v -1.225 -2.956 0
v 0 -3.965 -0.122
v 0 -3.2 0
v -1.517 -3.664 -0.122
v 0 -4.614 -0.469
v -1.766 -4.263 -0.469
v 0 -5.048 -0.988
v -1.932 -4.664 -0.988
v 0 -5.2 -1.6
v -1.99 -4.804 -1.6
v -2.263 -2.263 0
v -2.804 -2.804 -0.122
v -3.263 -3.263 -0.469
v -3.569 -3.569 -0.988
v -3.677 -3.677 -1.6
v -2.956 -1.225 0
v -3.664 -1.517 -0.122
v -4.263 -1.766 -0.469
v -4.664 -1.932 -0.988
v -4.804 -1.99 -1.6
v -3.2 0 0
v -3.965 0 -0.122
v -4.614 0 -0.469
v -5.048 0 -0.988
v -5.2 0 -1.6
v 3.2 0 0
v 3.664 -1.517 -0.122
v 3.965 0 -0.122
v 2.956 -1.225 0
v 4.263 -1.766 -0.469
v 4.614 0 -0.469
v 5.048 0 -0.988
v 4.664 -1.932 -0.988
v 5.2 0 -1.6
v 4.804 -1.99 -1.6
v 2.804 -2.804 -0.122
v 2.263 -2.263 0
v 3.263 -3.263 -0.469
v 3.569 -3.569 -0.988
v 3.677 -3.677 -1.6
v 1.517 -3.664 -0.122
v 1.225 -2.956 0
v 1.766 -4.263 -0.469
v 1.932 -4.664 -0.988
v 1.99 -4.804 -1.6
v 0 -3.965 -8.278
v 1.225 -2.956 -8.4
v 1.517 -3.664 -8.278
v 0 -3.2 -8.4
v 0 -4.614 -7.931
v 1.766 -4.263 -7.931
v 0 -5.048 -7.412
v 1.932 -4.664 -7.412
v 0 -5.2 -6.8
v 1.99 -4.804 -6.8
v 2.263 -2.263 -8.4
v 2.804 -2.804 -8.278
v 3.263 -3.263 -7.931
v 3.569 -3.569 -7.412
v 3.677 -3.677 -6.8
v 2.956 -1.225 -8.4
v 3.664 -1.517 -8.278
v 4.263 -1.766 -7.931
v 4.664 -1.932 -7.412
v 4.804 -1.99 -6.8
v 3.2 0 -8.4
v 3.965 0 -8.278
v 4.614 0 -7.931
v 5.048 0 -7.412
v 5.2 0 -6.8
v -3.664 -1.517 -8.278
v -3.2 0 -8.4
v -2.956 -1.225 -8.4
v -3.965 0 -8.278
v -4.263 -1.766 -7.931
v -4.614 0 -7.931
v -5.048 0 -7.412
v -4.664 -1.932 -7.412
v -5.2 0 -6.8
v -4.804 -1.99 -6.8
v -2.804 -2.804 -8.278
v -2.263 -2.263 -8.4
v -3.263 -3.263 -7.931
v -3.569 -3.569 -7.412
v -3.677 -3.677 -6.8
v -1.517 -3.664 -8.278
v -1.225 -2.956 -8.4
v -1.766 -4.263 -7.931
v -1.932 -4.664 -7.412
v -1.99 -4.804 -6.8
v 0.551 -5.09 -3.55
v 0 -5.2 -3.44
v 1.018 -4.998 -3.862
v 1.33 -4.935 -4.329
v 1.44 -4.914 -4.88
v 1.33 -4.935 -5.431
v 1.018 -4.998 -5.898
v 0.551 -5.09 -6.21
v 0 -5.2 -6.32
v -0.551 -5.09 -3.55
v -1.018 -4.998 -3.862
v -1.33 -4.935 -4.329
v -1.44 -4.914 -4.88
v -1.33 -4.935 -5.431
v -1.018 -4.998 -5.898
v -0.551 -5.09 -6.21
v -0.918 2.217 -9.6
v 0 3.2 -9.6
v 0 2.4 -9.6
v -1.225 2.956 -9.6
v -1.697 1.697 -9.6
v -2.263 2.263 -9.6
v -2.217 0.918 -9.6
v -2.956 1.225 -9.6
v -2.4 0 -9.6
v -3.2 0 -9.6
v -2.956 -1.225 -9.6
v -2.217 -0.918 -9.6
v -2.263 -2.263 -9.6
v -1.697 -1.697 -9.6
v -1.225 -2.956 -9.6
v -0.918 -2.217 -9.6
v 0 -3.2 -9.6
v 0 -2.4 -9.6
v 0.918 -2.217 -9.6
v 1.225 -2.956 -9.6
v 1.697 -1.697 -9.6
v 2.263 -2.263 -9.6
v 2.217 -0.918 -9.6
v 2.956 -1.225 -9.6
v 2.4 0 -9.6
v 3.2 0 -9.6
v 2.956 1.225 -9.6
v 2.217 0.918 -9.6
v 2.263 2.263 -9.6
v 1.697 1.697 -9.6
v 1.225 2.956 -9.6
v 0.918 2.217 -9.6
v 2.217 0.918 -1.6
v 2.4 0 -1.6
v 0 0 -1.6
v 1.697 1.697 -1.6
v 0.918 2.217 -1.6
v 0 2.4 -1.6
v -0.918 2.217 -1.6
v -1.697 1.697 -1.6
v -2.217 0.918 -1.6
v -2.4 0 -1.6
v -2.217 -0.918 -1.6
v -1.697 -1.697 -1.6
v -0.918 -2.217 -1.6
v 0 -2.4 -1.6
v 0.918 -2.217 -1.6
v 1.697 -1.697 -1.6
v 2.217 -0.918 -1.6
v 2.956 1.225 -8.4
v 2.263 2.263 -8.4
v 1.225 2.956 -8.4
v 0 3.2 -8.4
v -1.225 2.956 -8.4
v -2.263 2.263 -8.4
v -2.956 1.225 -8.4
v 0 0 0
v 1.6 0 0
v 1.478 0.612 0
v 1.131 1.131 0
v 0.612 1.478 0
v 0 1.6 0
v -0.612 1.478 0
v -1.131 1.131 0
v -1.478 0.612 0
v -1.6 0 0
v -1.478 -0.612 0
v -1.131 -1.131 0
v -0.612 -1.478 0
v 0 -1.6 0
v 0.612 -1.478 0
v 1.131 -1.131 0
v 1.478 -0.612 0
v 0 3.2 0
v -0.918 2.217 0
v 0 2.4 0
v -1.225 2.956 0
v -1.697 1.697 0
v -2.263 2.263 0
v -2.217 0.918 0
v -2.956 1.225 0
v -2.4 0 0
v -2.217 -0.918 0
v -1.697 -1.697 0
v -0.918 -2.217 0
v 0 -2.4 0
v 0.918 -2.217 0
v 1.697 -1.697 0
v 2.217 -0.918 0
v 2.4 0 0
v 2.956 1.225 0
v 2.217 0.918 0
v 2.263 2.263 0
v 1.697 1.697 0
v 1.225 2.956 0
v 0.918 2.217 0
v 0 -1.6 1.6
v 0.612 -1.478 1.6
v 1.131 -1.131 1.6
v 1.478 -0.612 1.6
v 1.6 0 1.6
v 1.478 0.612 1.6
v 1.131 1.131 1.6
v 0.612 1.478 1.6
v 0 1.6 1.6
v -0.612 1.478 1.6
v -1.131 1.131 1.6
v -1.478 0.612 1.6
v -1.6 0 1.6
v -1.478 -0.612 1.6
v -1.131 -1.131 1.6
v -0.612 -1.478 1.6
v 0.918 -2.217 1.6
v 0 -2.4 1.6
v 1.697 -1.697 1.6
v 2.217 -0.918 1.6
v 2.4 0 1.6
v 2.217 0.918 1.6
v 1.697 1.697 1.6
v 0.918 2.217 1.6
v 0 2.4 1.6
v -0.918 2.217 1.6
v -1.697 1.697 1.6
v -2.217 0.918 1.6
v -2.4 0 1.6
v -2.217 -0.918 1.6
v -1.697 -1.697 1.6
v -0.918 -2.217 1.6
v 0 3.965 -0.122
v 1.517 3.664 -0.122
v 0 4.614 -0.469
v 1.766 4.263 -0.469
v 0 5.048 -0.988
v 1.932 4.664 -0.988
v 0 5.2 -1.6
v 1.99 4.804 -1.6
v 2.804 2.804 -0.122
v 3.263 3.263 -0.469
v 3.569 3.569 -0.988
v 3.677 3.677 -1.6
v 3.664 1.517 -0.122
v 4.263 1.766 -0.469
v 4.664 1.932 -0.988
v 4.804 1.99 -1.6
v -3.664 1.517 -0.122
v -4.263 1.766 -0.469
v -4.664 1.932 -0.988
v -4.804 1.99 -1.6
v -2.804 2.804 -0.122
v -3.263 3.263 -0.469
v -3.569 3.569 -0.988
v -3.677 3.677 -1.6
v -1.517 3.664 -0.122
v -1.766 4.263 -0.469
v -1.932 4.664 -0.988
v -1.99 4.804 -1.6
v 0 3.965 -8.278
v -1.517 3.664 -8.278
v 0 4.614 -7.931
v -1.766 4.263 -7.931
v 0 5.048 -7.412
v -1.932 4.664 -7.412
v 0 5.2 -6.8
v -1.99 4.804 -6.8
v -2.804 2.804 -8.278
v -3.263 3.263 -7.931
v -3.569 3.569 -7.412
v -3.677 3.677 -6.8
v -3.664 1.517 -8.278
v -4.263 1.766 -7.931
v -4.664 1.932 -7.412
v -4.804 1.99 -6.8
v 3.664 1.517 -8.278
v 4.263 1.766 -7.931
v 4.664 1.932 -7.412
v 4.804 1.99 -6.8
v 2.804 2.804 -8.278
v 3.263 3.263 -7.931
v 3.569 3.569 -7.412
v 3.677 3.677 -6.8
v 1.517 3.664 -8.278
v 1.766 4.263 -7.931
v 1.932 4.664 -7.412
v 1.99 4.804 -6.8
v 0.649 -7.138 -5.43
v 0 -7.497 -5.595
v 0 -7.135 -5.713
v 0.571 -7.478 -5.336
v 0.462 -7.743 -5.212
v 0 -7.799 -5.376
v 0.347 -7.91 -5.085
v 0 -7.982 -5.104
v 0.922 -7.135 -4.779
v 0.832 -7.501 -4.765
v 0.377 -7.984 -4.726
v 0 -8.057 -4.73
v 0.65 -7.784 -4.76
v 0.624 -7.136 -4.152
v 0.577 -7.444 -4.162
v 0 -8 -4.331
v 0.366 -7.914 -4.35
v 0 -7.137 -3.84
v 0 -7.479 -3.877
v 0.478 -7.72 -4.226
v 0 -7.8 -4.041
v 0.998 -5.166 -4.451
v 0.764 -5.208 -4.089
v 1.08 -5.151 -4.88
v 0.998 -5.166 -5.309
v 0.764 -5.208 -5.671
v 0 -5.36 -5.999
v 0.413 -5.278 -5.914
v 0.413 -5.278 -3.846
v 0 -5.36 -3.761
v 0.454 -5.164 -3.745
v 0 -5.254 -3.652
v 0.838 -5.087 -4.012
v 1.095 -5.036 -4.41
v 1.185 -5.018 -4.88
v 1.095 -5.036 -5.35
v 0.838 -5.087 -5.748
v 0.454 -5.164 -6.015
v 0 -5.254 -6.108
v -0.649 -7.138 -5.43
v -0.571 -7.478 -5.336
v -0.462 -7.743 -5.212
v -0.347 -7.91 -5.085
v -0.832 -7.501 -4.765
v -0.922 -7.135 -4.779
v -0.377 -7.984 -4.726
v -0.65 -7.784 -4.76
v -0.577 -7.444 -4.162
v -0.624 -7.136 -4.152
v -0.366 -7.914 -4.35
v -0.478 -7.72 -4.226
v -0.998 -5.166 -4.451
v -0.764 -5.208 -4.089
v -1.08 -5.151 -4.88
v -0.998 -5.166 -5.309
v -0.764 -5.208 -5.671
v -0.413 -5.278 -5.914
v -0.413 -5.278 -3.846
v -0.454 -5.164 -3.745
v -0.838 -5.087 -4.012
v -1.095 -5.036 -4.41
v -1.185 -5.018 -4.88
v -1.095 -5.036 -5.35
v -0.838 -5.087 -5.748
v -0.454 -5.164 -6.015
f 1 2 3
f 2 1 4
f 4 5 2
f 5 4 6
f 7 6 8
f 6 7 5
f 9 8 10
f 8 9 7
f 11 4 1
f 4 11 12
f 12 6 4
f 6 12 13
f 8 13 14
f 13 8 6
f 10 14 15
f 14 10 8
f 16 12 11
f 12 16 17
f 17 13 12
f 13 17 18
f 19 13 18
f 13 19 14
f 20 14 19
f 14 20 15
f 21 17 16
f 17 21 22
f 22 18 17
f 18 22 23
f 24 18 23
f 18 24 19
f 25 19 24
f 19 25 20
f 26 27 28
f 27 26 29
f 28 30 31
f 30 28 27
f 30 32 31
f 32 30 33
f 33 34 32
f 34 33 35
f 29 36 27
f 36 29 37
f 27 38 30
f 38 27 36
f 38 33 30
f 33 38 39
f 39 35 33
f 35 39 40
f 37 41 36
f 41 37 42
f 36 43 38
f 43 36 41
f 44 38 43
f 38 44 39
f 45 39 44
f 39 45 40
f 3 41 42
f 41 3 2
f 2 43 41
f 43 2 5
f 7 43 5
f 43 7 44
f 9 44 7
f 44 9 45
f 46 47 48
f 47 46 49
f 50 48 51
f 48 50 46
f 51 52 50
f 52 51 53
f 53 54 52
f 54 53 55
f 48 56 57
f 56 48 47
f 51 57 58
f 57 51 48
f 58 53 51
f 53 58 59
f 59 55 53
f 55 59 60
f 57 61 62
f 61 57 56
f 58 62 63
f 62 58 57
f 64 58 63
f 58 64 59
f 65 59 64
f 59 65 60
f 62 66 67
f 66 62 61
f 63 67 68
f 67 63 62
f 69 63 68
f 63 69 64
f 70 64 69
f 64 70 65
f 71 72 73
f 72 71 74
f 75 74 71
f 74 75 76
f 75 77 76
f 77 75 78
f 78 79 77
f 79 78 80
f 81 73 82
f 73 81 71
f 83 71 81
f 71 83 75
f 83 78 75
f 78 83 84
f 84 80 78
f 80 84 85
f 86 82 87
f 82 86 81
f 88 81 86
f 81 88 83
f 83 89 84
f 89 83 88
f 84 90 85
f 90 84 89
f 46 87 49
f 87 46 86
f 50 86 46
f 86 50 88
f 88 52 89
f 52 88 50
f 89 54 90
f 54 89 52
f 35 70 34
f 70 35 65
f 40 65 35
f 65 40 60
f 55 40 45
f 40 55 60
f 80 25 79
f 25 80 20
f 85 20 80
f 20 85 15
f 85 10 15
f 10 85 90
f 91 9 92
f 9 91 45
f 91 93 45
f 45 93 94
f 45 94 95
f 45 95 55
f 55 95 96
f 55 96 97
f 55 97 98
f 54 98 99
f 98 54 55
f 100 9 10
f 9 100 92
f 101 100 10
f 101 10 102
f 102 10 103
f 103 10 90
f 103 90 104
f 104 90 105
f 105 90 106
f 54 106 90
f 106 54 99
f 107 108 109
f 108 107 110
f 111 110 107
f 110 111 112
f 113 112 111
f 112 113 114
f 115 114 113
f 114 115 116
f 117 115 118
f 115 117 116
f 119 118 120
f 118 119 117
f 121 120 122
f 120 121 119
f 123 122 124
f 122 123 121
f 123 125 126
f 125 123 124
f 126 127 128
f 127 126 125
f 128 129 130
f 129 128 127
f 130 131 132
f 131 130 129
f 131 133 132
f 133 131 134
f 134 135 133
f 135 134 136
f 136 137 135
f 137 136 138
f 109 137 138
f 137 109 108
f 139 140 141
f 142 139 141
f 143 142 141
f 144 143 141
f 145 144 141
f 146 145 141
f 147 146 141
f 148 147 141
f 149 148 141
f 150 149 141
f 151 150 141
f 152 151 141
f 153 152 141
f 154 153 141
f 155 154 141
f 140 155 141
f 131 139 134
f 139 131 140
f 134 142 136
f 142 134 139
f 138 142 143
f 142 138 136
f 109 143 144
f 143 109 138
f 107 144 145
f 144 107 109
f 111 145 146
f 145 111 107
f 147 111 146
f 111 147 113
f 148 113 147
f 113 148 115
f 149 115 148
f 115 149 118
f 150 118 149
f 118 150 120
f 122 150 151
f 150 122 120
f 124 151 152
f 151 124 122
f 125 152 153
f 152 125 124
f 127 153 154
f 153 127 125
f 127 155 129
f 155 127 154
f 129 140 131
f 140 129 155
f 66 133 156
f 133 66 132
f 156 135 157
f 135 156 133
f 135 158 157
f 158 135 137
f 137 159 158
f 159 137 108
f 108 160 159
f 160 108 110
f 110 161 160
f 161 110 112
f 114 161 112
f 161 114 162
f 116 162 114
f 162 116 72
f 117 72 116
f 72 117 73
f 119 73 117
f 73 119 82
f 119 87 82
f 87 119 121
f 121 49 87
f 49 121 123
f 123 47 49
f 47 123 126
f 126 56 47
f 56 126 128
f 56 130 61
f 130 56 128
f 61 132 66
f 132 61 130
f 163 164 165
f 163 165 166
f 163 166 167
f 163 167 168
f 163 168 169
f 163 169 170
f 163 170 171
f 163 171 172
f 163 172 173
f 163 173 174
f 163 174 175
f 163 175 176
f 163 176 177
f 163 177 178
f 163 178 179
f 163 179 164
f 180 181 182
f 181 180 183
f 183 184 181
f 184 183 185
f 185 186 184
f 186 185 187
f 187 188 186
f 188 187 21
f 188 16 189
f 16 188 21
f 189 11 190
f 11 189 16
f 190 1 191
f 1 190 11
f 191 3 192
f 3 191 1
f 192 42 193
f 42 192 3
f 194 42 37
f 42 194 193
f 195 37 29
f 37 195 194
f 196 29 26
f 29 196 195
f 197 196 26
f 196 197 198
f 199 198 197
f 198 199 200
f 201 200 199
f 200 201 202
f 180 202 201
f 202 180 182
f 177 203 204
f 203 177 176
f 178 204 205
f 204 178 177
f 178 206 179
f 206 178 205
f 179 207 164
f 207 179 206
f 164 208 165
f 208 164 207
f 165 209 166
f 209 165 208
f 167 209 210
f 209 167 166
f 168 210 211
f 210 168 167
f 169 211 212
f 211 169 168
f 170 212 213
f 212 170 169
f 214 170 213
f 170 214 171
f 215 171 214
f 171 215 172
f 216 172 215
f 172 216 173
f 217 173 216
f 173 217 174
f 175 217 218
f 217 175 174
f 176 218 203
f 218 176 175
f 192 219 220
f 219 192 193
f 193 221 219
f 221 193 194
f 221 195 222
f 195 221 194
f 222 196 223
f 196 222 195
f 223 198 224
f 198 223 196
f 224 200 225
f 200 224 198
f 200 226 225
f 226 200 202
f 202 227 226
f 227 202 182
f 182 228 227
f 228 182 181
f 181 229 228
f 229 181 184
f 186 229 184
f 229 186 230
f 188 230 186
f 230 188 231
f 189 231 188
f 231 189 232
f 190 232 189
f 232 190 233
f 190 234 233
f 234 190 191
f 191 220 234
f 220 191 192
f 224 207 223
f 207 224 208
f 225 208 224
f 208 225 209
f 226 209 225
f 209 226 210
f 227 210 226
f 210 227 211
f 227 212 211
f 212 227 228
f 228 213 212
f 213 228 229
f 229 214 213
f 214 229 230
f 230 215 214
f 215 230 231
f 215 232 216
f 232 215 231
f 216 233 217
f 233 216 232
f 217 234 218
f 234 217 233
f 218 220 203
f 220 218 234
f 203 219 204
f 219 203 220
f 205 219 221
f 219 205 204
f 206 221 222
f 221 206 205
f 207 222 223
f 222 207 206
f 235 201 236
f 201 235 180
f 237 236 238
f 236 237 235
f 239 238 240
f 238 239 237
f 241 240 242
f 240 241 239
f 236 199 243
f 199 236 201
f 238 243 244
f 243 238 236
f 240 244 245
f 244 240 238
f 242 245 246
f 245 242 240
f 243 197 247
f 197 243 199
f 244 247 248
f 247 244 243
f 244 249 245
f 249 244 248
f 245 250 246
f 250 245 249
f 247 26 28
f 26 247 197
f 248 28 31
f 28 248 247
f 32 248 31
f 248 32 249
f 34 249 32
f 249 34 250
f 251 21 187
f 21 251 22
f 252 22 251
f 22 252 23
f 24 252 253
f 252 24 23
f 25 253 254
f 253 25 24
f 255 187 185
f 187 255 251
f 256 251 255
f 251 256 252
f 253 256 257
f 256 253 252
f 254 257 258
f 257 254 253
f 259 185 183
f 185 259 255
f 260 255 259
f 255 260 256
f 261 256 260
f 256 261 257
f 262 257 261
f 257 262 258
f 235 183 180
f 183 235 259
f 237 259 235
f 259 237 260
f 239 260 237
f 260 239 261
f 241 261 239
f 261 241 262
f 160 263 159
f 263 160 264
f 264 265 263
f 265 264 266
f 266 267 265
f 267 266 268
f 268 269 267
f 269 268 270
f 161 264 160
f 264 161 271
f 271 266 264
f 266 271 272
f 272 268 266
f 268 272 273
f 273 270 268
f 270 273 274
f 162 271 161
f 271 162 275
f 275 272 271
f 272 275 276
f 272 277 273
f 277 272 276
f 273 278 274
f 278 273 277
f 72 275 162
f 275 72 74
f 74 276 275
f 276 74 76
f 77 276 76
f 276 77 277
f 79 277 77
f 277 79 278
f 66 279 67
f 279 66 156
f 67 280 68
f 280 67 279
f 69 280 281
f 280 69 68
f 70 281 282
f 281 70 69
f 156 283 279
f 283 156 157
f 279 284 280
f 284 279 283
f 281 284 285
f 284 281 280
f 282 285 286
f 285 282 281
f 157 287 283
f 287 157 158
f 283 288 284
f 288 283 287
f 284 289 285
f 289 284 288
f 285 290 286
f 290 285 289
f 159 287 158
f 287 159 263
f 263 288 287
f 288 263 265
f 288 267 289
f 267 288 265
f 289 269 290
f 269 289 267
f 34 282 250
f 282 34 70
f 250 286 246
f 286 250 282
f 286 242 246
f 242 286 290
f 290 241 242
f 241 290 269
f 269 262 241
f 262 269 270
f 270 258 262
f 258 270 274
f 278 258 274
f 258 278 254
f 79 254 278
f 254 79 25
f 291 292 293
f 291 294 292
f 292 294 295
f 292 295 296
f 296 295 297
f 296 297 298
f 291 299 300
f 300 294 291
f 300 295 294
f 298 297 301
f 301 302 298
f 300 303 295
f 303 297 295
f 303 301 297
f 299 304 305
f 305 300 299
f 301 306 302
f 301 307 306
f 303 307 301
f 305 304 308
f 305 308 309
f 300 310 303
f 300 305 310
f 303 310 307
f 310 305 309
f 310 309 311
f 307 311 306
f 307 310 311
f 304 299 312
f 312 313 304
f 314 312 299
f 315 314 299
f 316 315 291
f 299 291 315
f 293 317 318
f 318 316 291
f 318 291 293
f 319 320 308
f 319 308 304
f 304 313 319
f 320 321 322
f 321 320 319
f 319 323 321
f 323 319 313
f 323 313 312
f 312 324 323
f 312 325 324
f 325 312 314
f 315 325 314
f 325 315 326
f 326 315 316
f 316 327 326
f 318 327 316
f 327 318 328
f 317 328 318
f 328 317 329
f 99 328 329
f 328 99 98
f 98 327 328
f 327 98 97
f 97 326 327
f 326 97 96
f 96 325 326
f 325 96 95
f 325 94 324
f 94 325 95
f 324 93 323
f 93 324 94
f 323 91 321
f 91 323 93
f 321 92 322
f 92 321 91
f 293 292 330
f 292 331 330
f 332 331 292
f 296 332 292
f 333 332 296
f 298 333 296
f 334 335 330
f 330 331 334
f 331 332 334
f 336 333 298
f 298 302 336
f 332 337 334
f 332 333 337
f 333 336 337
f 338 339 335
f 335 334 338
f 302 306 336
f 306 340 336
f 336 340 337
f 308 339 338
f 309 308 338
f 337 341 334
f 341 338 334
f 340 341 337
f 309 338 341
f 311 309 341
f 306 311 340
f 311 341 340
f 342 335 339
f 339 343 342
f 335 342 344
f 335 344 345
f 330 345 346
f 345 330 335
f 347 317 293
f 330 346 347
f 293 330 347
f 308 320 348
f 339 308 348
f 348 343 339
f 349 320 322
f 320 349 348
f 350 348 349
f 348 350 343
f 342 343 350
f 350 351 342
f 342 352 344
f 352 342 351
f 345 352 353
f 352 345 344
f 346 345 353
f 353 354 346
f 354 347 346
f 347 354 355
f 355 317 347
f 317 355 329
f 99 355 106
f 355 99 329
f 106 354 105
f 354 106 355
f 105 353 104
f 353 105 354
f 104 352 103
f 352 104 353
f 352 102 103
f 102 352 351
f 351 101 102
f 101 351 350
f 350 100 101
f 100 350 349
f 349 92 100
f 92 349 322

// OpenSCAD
use <../lib.scad>
use <../p/3-16cyli.scad>
use <s/102525s01.scad>
use <../p/t04o6250.scad>
function ldraw_lib__102525() = [
// 0 Minifig Head with Elongated Nose
// 0 Name: 102525.dat
// 0 Author: Gerald Lasser [GeraldLasser]
// 0 !LDRAW_ORG Part UPDATE 2026-08
// 0 !LICENSE Licensed under CC BY 4.0 : see CAreadme.txt
// 
// 0 BFC CERTIFY CCW
  [0,"BFC","CERTIFY"],
  [0,"BFC","CCW"],
// 
// 0 !CATEGORY Minifig Head
// 0 !KEYWORDS Disney 100, Pinocchio
// 
// 0 !HISTORY 2023-05-08 {LEGO Instructions App} Original part shape
// 0 !HISTORY 2023-11-27 [GeraldLasser] File preparation for LDraw Parts Tracker
// 0 !HISTORY 2026-08-31 [OrionP] Official Update 2026-08
// 
// 1 16 0 4 0 0 0 -8 0 -6.4 0 -8 0 0 t04o6250.dat
  [1,16,0,4,0,0,0,-8,0,-6.4,0,-8,0,0, ldraw_lib__t04o6250()],
// 1 16 0 4 0 8 0 0 0 -6.4 0 0 0 -8 t04o6250.dat
  [1,16,0,4,0,8,0,0,0,-6.4,0,0,0,-8, ldraw_lib__t04o6250()],
// 1 16 0 17 0 0 0 8 0 6.4 0 -8 0 0 t04o6250.dat
  [1,16,0,17,0,0,0,8,0,6.4,0,-8,0,0, ldraw_lib__t04o6250()],
// 1 16 0 17 0 -8 0 0 0 6.4 0 0 0 -8 t04o6250.dat
  [1,16,0,17,0,-8,0,0,0,6.4,0,0,0,-8, ldraw_lib__t04o6250()],
// 
// 1 16 0 4 0 13 0 0 0 13 0 0 0 -13 3-16cyli.dat
  [1,16,0,4,0,13,0,0,0,13,0,0,0,-13, ldraw_lib__3_16cyli()],
// 1 16 0 4 0 -13 0 0 0 13 0 0 0 -13 3-16cyli.dat
  [1,16,0,4,0,-13,0,0,0,13,0,0,0,-13, ldraw_lib__3_16cyli()],
// 
// 4 16 4.9751 4 -12.0107 0 4 -13 0 8.6 -13 1.3777 8.874 -12.726
  [4,16,4.9751,4,-12.0107,0,4,-13,0,8.6,-13,1.3777,8.874,-12.726],
// 3 16 1.3777 8.874 -12.726 2.5456 9.6544 -12.4938 4.9751 4 -12.0107
  [3,16,1.3777,8.874,-12.726,2.5456,9.6544,-12.4938,4.9751,4,-12.0107],
// 3 16 4.9751 4 -12.0107 2.5456 9.6544 -12.4938 3.326 10.8223 -12.3386
  [3,16,4.9751,4,-12.0107,2.5456,9.6544,-12.4938,3.326,10.8223,-12.3386],
// 3 16 4.9751 4 -12.0107 3.326 10.8223 -12.3386 3.6 12.2 -12.2841
  [3,16,4.9751,4,-12.0107,3.326,10.8223,-12.3386,3.6,12.2,-12.2841],
// 3 16 4.9751 4 -12.0107 3.6 12.2 -12.2841 4.9751 17 -12.0107
  [3,16,4.9751,4,-12.0107,3.6,12.2,-12.2841,4.9751,17,-12.0107],
// 3 16 4.9751 17 -12.0107 3.6 12.2 -12.2841 3.326 13.5777 -12.3386
  [3,16,4.9751,17,-12.0107,3.6,12.2,-12.2841,3.326,13.5777,-12.3386],
// 3 16 4.9751 17 -12.0107 3.326 13.5777 -12.3386 2.5456 14.7456 -12.4938
  [3,16,4.9751,17,-12.0107,3.326,13.5777,-12.3386,2.5456,14.7456,-12.4938],
// 3 16 4.9751 17 -12.0107 2.5456 14.7456 -12.4938 1.3777 15.526 -12.726
  [3,16,4.9751,17,-12.0107,2.5456,14.7456,-12.4938,1.3777,15.526,-12.726],
// 4 16 1.3777 15.526 -12.726 0 15.8 -13 0 17 -13 4.9751 17 -12.0107
  [4,16,1.3777,15.526,-12.726,0,15.8,-13,0,17,-13,4.9751,17,-12.0107],
// 
// 4 16 0 8.6 -13 0 4 -13 -4.9751 4 -12.0107 -1.3777 8.874 -12.726
  [4,16,0,8.6,-13,0,4,-13,-4.9751,4,-12.0107,-1.3777,8.874,-12.726],
// 3 16 -2.5456 9.6544 -12.4938 -1.3777 8.874 -12.726 -4.9751 4 -12.0107
  [3,16,-2.5456,9.6544,-12.4938,-1.3777,8.874,-12.726,-4.9751,4,-12.0107],
// 3 16 -2.5456 9.6544 -12.4938 -4.9751 4 -12.0107 -3.326 10.8223 -12.3386
  [3,16,-2.5456,9.6544,-12.4938,-4.9751,4,-12.0107,-3.326,10.8223,-12.3386],
// 3 16 -3.326 10.8223 -12.3386 -4.9751 4 -12.0107 -3.6 12.2 -12.2841
  [3,16,-3.326,10.8223,-12.3386,-4.9751,4,-12.0107,-3.6,12.2,-12.2841],
// 3 16 -3.6 12.2 -12.2841 -4.9751 4 -12.0107 -4.9751 17 -12.0107
  [3,16,-3.6,12.2,-12.2841,-4.9751,4,-12.0107,-4.9751,17,-12.0107],
// 3 16 -3.6 12.2 -12.2841 -4.9751 17 -12.0107 -3.326 13.5777 -12.3386
  [3,16,-3.6,12.2,-12.2841,-4.9751,17,-12.0107,-3.326,13.5777,-12.3386],
// 3 16 -3.326 13.5777 -12.3386 -4.9751 17 -12.0107 -2.5456 14.7456 -12.4938
  [3,16,-3.326,13.5777,-12.3386,-4.9751,17,-12.0107,-2.5456,14.7456,-12.4938],
// 3 16 -2.5456 14.7456 -12.4938 -4.9751 17 -12.0107 -1.3777 15.526 -12.726
  [3,16,-2.5456,14.7456,-12.4938,-4.9751,17,-12.0107,-1.3777,15.526,-12.726],
// 4 16 0 17 -13 0 15.8 -13 -1.3777 15.526 -12.726 -4.9751 17 -12.0107
  [4,16,0,17,-13,0,15.8,-13,-1.3777,15.526,-12.726,-4.9751,17,-12.0107],
// 
// 1 16 0 0 0 1 0 0 0 1 0 0 0 1 s\102525s01.dat
  [1,16,0,0,0,1,0,0,0,1,0,0,0,1, ldraw_lib__s__102525s01()],
// 
// 5 24 0 8.6 -13 0 4 -13 4.9751 4 -12.0107 -4.9752 4 -12.0104
  [5,24,0,8.6,-13,0,4,-13,4.9751,4,-12.0107,-4.9752,4,-12.0104],
// 5 24 0 17 -13 0 15.8 -13 4.9751 17 -12.0107 -4.9752 17 -12.0104
  [5,24,0,17,-13,0,15.8,-13,4.9751,17,-12.0107,-4.9752,17,-12.0104],
// 5 24 4.9751 4 -12.0107 4.9751 17 -12.0107 0 17 -13 9.192 17 -9.192
  [5,24,4.9751,4,-12.0107,4.9751,17,-12.0107,0,17,-13,9.192,17,-9.192],
// 5 24 -4.9752 4 -12.0104 -4.9752 17 -12.0104 -9.1923 17 -9.1923 0 17 -13
  [5,24,-4.9752,4,-12.0104,-4.9752,17,-12.0104,-9.1923,17,-9.1923,0,17,-13],
// 
// 5 24 3.326 13.5777 -12.3386 2.5456 14.7456 -12.4938 4.9751 17 -12.0107 2.7382 13.375 -12.5903
  [5,24,3.326,13.5777,-12.3386,2.5456,14.7456,-12.4938,4.9751,17,-12.0107,2.7382,13.375,-12.5903],
// 5 24 0 15.8 -13 -1.3777 15.526 -12.726 -1.134 15.037 -12.9093 -4.9751 17 -12.0107
  [5,24,0,15.8,-13,-1.3777,15.526,-12.726,-1.134,15.037,-12.9093,-4.9751,17,-12.0107],
// 5 24 -1.3777 15.526 -12.726 -2.5456 14.7456 -12.4938 -4.9751 17 -12.0107 -2.0956 14.3712 -12.7181
  [5,24,-1.3777,15.526,-12.726,-2.5456,14.7456,-12.4938,-4.9751,17,-12.0107,-2.0956,14.3712,-12.7181],
// 5 24 -1.3777 8.874 -12.726 0 8.6 -13 0 9.1295 -13.1348 0 4 -13
  [5,24,-1.3777,8.874,-12.726,0,8.6,-13,0,9.1295,-13.1348,0,4,-13],
// 5 24 3.6 12.2 -12.2841 3.326 13.5777 -12.3386 4.9751 17 -12.0107 2.9635 12.2 -12.5455
  [5,24,3.6,12.2,-12.2841,3.326,13.5777,-12.3386,4.9751,17,-12.0107,2.9635,12.2,-12.5455],
// 5 24 -2.5456 9.6544 -12.4938 -1.3777 8.874 -12.726 -1.134 9.363 -12.9093 -4.9751 4 -12.0107
  [5,24,-2.5456,9.6544,-12.4938,-1.3777,8.874,-12.726,-1.134,9.363,-12.9093,-4.9751,4,-12.0107],
// 5 24 0 15.8 -13 1.3777 15.526 -12.726 1.134 15.037 -12.9093 0 17 -13
  [5,24,0,15.8,-13,1.3777,15.526,-12.726,1.134,15.037,-12.9093,0,17,-13],
// 5 24 -3.6 12.2 -12.2841 -3.326 10.8223 -12.3386 -2.7382 11.0251 -12.5903 -4.9751 4 -12.0107
  [5,24,-3.6,12.2,-12.2841,-3.326,10.8223,-12.3386,-2.7382,11.0251,-12.5903,-4.9751,4,-12.0107],
// 5 24 2.5456 14.7456 -12.4938 1.3777 15.526 -12.726 4.9751 17 -12.0107 2.0956 14.3712 -12.7181
  [5,24,2.5456,14.7456,-12.4938,1.3777,15.526,-12.726,4.9751,17,-12.0107,2.0956,14.3712,-12.7181],
// 5 24 -3.326 10.8223 -12.3386 -2.5456 9.6544 -12.4938 -2.0956 10.0288 -12.7181 -4.9751 4 -12.0107
  [5,24,-3.326,10.8223,-12.3386,-2.5456,9.6544,-12.4938,-2.0956,10.0288,-12.7181,-4.9751,4,-12.0107],
// 5 24 2.5456 9.6544 -12.4938 3.326 10.8223 -12.3386 4.9751 4 -12.0107 2.0956 10.0288 -12.7181
  [5,24,2.5456,9.6544,-12.4938,3.326,10.8223,-12.3386,4.9751,4,-12.0107,2.0956,10.0288,-12.7181],
// 5 24 -3.326 13.5777 -12.3386 -3.6 12.2 -12.2841 -2.9635 12.2 -12.5455 -4.9751 17 -12.0107
  [5,24,-3.326,13.5777,-12.3386,-3.6,12.2,-12.2841,-2.9635,12.2,-12.5455,-4.9751,17,-12.0107],
// 5 24 -2.5456 14.7456 -12.4938 -3.326 13.5777 -12.3386 -2.7382 13.375 -12.5903 -4.9751 17 -12.0107
  [5,24,-2.5456,14.7456,-12.4938,-3.326,13.5777,-12.3386,-2.7382,13.375,-12.5903,-4.9751,17,-12.0107],
// 5 24 1.3777 8.874 -12.726 2.5456 9.6544 -12.4938 4.9751 4 -12.0107 1.134 9.363 -12.9093
  [5,24,1.3777,8.874,-12.726,2.5456,9.6544,-12.4938,4.9751,4,-12.0107,1.134,9.363,-12.9093],
// 5 24 1.3777 8.874 -12.726 0 8.6 -13 0 9.1295 -13.1348 4.9751 4 -12.0107
  [5,24,1.3777,8.874,-12.726,0,8.6,-13,0,9.1295,-13.1348,4.9751,4,-12.0107],
// 5 24 3.326 10.8223 -12.3386 3.6 12.2 -12.2841 4.9751 4 -12.0107 2.7382 11.0251 -12.5903
  [5,24,3.326,10.8223,-12.3386,3.6,12.2,-12.2841,4.9751,4,-12.0107,2.7382,11.0251,-12.5903],
];
module ldraw_lib__102525(step=0, col=false, unit=2/5, alt=false, line=0.2, solid=!$preview)
    makepoly(ldraw_lib__102525(), step=step, col=col, unit=unit, alt=alt, line=line, solid=solid);
ldraw_lib__102525(line=0.2);
